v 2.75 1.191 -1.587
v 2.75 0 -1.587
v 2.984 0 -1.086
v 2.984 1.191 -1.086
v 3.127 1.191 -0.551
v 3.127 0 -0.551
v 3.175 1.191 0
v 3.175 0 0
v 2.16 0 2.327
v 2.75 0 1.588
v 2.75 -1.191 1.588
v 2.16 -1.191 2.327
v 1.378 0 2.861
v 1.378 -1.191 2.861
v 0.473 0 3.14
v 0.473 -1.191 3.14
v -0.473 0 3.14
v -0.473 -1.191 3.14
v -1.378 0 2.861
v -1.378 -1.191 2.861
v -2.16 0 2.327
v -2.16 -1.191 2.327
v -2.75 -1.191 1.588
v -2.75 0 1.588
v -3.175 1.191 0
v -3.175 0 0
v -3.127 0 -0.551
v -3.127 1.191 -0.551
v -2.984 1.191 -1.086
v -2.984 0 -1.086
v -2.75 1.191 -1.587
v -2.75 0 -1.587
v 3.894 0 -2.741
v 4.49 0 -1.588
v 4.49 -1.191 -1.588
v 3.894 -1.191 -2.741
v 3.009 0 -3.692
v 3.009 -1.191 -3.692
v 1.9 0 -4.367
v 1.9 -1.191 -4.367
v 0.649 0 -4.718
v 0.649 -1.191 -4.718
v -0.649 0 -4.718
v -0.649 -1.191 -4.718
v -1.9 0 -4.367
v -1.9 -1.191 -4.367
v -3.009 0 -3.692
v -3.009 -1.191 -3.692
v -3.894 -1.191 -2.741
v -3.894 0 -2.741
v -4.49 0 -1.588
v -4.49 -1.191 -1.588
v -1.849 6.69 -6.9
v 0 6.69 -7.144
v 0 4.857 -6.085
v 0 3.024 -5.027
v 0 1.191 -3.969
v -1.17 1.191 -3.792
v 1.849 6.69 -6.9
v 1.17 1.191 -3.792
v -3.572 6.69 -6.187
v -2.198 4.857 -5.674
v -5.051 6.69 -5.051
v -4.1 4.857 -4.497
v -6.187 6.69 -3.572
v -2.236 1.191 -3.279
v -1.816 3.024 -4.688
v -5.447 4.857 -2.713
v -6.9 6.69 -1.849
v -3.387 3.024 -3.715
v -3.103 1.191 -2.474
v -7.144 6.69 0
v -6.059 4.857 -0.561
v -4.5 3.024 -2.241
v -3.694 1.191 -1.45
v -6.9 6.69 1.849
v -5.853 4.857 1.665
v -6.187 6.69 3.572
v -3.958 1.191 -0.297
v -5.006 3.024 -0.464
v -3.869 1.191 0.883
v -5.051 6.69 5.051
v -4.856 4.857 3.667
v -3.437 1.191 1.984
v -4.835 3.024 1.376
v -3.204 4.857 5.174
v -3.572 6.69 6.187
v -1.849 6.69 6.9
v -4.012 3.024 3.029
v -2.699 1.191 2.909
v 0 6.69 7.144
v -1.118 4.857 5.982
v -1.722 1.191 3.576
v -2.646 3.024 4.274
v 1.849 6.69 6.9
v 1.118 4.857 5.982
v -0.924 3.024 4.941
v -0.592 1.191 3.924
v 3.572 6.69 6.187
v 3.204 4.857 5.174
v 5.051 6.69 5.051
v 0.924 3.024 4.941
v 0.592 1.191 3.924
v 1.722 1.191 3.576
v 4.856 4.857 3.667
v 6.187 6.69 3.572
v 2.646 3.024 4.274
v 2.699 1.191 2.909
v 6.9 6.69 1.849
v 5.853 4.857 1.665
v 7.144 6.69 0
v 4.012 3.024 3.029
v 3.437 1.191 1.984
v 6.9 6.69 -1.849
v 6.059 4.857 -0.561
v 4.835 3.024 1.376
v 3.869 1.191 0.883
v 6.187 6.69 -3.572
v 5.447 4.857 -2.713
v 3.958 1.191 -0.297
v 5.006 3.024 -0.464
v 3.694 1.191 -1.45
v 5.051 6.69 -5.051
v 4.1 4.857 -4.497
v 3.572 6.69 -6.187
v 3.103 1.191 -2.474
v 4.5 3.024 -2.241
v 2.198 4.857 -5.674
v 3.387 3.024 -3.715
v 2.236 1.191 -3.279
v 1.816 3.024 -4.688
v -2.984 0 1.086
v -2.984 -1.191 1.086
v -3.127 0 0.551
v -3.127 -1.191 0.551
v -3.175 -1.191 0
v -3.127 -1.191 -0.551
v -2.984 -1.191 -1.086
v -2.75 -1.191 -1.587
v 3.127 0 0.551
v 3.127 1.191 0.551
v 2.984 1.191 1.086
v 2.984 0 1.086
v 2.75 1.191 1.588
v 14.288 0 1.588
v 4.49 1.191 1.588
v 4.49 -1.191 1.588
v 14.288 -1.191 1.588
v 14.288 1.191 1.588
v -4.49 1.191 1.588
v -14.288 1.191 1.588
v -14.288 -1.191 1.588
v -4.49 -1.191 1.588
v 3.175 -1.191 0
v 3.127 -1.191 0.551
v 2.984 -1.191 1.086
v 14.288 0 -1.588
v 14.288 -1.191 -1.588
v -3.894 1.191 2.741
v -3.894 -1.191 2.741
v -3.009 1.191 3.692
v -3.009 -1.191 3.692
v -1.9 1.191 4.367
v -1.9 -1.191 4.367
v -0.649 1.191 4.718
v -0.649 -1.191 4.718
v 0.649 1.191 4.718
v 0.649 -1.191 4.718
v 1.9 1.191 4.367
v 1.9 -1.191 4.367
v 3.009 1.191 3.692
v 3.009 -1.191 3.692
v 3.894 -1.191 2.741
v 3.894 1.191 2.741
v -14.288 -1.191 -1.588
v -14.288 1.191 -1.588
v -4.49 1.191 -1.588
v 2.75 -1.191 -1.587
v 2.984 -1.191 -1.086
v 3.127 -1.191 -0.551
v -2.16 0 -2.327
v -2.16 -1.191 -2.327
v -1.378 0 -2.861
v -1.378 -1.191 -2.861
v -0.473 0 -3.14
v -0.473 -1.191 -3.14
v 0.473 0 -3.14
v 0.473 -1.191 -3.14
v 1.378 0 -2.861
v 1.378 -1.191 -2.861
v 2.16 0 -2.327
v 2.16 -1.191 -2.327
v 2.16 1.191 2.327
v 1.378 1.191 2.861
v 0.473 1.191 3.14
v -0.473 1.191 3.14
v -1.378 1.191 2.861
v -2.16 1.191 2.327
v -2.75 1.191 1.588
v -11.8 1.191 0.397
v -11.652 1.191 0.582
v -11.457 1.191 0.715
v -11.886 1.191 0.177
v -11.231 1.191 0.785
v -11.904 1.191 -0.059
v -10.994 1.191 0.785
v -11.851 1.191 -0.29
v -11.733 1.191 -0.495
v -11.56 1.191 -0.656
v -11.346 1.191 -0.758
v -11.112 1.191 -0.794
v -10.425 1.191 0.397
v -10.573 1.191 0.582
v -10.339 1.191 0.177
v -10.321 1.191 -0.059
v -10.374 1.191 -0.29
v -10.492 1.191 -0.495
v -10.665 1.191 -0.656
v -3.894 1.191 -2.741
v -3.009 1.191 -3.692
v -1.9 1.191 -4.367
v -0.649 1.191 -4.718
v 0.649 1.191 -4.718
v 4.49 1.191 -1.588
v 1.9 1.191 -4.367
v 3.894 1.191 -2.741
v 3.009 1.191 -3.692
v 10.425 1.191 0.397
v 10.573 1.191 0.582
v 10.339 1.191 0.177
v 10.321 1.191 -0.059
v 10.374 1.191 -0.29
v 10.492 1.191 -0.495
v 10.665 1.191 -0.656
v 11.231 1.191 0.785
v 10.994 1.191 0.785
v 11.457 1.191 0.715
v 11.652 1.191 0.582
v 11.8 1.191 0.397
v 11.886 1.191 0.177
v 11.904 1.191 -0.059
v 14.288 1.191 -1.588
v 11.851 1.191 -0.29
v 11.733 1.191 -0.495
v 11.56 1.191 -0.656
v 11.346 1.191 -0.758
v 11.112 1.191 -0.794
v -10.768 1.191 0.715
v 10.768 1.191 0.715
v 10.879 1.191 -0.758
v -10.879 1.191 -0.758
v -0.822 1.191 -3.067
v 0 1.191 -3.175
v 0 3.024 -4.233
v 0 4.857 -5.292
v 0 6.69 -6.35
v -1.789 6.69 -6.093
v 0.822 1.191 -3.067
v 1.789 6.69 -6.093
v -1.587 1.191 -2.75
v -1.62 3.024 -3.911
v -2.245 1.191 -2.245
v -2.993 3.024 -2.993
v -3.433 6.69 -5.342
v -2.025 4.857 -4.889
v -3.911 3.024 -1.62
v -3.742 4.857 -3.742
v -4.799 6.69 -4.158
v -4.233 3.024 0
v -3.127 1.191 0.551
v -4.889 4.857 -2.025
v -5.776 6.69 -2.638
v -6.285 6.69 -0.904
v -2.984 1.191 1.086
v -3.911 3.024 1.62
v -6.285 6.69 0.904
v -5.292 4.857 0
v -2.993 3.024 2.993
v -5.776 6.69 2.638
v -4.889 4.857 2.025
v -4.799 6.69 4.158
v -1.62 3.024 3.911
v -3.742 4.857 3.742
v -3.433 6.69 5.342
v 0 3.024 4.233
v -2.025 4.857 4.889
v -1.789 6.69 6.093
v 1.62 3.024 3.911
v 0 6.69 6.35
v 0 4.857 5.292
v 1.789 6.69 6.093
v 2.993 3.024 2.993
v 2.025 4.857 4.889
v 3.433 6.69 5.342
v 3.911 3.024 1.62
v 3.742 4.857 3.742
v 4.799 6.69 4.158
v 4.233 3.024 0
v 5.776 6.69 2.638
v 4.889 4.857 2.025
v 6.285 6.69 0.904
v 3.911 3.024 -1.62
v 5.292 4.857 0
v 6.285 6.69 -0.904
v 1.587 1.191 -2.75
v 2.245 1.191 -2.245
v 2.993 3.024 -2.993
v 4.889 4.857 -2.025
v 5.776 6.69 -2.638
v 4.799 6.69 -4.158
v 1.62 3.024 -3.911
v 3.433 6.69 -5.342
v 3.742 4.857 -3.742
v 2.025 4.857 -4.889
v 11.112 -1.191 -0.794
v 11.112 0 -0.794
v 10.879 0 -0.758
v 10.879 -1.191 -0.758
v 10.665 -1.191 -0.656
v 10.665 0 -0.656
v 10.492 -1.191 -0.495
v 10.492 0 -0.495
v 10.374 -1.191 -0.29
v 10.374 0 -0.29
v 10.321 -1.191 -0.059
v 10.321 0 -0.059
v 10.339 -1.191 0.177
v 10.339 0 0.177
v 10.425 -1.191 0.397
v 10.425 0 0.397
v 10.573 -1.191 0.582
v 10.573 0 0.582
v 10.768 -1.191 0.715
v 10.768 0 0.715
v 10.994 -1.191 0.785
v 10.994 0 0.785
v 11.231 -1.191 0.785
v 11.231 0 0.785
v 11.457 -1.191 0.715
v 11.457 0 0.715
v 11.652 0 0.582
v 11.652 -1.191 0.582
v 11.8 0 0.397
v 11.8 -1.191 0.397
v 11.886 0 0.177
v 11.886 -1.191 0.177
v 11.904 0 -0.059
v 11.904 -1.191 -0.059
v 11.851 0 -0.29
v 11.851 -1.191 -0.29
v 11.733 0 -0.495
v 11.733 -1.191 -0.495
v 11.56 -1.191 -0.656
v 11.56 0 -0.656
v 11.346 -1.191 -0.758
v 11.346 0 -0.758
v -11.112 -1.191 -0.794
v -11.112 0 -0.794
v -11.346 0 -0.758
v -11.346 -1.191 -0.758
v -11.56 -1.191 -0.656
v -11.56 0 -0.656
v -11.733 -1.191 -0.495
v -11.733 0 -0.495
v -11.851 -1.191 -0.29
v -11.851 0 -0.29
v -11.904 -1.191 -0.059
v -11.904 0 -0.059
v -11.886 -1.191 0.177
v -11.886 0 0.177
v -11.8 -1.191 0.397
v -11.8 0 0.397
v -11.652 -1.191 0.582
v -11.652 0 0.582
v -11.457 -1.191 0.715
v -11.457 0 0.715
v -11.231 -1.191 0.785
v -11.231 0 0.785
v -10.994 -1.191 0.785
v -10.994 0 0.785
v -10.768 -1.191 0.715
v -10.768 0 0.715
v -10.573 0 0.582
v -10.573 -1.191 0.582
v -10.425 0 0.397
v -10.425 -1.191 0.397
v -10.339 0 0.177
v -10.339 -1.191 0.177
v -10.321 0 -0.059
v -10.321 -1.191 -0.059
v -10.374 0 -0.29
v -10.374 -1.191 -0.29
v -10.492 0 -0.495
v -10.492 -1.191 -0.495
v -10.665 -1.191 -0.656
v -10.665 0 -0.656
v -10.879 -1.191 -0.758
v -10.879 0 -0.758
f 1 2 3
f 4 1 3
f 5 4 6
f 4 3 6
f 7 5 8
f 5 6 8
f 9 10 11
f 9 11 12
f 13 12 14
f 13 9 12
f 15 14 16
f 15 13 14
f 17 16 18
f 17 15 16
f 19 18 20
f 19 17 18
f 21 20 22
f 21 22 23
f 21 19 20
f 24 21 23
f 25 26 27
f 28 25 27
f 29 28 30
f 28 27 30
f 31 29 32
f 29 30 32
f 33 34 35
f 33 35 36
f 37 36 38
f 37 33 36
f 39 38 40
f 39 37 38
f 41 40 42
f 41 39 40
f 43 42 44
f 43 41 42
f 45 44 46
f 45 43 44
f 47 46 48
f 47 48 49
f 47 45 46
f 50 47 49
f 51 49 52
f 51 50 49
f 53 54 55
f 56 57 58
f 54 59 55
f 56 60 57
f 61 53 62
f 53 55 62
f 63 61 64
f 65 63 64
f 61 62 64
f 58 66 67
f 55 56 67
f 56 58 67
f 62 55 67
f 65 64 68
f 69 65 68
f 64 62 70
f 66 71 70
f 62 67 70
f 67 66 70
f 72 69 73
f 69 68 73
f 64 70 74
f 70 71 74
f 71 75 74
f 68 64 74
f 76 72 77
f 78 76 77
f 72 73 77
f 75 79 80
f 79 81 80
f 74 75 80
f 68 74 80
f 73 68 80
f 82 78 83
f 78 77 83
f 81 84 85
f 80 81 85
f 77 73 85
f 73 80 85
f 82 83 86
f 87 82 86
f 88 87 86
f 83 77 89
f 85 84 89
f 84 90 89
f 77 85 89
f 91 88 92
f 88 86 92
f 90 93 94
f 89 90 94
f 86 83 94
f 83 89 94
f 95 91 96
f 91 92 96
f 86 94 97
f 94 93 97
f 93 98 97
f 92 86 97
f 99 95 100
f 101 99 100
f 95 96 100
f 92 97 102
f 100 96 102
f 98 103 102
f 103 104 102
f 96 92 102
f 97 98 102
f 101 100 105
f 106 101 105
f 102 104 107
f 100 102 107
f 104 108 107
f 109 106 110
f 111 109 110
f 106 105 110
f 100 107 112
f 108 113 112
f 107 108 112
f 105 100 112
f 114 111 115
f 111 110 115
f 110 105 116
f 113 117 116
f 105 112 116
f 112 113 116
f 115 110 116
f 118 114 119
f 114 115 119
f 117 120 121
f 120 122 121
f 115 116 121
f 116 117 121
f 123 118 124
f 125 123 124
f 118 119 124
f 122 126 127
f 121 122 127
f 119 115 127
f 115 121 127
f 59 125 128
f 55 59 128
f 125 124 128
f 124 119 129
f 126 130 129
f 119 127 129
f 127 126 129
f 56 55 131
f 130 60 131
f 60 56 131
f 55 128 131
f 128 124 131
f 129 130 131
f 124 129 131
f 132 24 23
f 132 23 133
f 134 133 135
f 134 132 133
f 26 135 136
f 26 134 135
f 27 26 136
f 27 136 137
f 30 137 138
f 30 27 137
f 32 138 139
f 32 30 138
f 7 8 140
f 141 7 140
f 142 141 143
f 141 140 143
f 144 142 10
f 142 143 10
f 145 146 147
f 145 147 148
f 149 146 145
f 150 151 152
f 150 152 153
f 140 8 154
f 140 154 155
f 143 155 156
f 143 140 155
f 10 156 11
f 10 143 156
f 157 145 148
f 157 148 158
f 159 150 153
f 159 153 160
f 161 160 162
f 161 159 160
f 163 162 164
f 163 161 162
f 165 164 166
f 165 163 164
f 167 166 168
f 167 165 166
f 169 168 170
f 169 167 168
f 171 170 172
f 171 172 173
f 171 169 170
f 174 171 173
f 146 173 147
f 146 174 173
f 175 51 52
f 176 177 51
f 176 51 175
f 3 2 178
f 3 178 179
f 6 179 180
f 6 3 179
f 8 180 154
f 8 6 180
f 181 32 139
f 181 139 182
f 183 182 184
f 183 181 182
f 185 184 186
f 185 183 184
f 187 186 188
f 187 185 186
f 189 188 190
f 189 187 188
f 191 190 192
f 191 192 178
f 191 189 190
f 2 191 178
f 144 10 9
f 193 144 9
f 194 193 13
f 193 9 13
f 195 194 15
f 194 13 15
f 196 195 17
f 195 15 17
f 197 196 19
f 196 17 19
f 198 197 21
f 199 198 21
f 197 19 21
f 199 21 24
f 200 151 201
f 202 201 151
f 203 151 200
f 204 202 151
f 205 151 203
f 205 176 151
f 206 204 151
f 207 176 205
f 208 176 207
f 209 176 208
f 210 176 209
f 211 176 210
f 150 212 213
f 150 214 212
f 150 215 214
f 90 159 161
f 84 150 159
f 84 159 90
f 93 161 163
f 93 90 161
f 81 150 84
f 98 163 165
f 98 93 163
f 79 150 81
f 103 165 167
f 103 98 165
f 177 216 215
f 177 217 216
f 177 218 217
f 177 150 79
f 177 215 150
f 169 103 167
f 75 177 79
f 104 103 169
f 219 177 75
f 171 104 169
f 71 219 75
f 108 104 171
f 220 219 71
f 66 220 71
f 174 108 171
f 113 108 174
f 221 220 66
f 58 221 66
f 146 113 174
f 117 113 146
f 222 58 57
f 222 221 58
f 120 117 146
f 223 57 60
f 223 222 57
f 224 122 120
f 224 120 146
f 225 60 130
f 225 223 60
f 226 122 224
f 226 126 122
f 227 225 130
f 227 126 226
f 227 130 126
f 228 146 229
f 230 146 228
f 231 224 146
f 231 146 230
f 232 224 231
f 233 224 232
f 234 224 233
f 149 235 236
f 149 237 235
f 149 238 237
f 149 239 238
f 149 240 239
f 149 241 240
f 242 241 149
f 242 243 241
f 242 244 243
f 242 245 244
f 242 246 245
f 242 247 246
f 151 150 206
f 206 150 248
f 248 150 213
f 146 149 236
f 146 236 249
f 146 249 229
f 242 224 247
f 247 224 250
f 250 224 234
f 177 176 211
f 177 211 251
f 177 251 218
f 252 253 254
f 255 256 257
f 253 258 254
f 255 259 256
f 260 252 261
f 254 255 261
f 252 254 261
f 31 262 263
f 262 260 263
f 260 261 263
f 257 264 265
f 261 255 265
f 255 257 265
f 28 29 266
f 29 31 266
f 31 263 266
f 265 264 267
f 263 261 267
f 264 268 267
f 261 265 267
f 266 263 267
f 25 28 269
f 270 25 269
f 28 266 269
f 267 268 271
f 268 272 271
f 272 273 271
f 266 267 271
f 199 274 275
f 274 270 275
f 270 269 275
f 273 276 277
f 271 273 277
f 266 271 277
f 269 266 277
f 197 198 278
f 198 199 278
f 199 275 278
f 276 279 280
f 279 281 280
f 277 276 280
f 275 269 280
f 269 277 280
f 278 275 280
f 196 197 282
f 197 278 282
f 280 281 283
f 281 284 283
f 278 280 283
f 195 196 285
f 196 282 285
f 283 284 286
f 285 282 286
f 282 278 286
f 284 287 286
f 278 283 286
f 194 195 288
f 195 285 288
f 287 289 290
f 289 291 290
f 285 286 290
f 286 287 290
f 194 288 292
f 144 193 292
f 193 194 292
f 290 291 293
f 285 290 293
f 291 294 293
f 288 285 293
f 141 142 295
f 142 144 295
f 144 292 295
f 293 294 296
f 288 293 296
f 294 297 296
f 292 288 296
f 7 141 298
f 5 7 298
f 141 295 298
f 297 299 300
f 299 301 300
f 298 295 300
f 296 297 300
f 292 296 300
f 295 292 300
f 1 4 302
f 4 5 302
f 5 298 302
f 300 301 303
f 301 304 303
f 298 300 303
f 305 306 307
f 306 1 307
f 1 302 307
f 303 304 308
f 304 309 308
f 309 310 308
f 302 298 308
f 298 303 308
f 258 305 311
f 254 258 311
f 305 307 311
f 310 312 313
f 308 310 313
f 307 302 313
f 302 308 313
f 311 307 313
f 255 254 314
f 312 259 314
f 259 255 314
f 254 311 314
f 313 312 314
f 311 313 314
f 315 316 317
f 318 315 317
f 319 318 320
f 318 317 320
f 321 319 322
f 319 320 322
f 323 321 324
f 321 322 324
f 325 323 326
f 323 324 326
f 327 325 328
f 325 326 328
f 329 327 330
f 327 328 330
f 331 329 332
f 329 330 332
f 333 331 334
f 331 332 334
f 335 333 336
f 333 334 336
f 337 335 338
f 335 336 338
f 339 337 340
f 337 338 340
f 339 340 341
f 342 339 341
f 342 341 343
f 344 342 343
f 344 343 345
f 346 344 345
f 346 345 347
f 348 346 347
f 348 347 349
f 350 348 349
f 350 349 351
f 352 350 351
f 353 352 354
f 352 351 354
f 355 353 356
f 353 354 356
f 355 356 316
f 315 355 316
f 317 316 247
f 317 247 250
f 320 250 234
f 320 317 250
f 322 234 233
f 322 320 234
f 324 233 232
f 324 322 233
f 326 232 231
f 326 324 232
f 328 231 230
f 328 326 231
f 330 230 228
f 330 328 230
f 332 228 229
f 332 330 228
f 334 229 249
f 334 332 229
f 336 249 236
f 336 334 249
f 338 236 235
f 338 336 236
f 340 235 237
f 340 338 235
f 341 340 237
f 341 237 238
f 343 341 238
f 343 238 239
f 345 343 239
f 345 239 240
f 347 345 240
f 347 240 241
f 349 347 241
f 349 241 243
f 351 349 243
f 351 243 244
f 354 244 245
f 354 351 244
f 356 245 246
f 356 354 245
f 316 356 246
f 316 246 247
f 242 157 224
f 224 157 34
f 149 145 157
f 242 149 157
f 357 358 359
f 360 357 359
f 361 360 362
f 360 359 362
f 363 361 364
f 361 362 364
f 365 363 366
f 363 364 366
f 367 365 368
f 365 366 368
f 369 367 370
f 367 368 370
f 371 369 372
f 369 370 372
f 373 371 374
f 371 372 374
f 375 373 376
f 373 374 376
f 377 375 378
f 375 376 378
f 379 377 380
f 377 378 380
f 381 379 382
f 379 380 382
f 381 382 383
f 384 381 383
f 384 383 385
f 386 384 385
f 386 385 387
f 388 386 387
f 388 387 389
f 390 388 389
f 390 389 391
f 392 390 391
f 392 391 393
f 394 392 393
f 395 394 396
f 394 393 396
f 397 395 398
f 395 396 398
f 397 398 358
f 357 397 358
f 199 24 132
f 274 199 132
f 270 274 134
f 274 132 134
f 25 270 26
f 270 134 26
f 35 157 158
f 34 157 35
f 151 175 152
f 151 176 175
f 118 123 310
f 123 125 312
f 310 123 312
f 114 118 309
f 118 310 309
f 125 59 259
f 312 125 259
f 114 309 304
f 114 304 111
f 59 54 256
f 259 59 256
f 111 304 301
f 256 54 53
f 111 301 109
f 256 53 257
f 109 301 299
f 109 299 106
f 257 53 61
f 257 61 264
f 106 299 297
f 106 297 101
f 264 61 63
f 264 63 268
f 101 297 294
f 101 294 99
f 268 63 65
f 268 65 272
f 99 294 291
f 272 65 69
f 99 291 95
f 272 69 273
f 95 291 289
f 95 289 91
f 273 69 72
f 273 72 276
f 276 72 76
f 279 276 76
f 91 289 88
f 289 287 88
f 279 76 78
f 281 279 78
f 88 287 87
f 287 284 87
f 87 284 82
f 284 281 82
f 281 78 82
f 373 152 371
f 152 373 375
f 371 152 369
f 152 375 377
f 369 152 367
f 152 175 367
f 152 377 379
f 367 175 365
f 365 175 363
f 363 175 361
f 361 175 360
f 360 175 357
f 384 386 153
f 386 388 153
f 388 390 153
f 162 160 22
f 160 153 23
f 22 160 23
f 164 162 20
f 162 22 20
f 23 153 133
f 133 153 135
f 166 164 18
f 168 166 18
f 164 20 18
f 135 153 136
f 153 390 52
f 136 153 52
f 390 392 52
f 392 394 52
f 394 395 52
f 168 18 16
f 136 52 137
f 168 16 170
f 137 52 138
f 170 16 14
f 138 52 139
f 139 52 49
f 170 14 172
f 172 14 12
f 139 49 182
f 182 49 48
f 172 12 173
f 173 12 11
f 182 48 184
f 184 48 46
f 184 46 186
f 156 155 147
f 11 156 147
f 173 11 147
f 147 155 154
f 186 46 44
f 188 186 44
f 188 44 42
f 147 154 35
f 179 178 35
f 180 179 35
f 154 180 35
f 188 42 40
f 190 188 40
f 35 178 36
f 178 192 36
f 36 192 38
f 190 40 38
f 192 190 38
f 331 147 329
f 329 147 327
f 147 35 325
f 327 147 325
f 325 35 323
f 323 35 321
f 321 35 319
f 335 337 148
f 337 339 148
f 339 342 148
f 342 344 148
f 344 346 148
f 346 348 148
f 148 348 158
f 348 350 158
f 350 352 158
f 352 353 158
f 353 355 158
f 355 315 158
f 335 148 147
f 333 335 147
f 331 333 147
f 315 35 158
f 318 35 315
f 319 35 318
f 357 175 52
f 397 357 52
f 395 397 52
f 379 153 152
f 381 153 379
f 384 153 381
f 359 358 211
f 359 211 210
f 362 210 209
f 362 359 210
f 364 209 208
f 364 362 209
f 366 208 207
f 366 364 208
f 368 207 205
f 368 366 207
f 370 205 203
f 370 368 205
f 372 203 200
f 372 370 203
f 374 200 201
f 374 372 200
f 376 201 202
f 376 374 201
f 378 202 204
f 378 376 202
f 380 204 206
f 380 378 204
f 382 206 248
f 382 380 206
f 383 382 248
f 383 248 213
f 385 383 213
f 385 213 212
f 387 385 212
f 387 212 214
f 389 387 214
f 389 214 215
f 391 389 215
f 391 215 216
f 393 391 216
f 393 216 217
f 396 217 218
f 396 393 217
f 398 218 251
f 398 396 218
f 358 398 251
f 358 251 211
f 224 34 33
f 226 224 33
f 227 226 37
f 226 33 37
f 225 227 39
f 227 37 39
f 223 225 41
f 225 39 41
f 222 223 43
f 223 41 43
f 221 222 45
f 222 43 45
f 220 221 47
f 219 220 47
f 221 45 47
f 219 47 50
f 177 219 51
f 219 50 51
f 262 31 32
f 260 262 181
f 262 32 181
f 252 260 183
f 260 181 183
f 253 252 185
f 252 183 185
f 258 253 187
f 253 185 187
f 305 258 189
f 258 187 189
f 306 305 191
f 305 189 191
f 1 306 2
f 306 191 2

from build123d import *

# Parameters (mm, degrees)
SKETCH1_R           = 0.79375
BOSS_EXTRUDE1_DEPTH = 1.190625


with BuildPart() as part:
    # Sketch1 → Boss-Extrude1 (new, symmetric)
    # profile 1 of 14: a face of its own
    with BuildSketch(Plane(origin=(0, 0, 0), x_dir=(1, 0, 0), z_dir=(0, 1, 0))):
        with BuildLine():
            ThreePointArc((-4.682314967, -0.870248702), (-4.742411374, -0.436967517), (-4.7625, 0))
            ThreePointArc((-4.7625, 0), (-4.69391314, 0.805348174), (-4.490128061, 1.5875))
            Line((-4.490128061, 1.5875), (-14.2875, 1.5875))
            Line((-14.2875, 1.5875), (-14.2875, -1.5875))
            Line((-14.2875, -1.5875), (-5.924630657, -1.5875))
            Line((-5.924630657, -1.5875), (-4.682314967, -0.870248702))
        make_face()
        with Locations(Location((-11.1125, 0, 0), (0, 0, 90))):
            Circle(SKETCH1_R, mode=Mode.SUBTRACT)
    # profile 2 of 14: a face of its own
    with BuildSketch(Plane(origin=(0, 0, 0), x_dir=(1, 0, 0), z_dir=(0, 1, 0))):
        with BuildLine():
            ThreePointArc((-2.749630657, 1.5875), (0, 3.175), (2.749630657, 1.5875))
            Line((2.749630657, 1.5875), (4.490128061, 1.5875))
            ThreePointArc((4.490128061, 1.5875), (0, 4.7625), (-4.490128061, 1.5875))
            Line((-4.490128061, 1.5875), (-2.749630657, 1.5875))
        make_face()
    # profile 3 of 14: a face of its own
    with BuildSketch(Plane(origin=(0, 0, 0), x_dir=(1, 0, 0), z_dir=(0, 1, 0))):
        with BuildLine():
            ThreePointArc((4.490128061, 1.5875), (4.69391314, 0.805348174), (4.7625, 0))
            ThreePointArc((4.7625, 0), (4.742411374, -0.436967517), (4.682314967, -0.870248702))
            Line((4.682314967, -0.870248702), (5.924630657, -1.5875))
            Line((5.924630657, -1.5875), (14.2875, -1.5875))
            Line((14.2875, -1.5875), (14.2875, 1.5875))
            Line((14.2875, 1.5875), (4.490128061, 1.5875))
        make_face()
        with Locations(Location((11.1125, 0, 0), (0, 0, 90))):
            Circle(SKETCH1_R, mode=Mode.SUBTRACT)
    # profile 4 of 14: a face of its own
    with BuildSketch(Plane(origin=(0, 0, 0), x_dir=(1, 0, 0), z_dir=(0, 1, 0))):
        with BuildLine():
            ThreePointArc((2.749630657, 1.5875), (3.066814498, 0.821750468), (3.175, 0))
            Line((3.175, 0), (4.7625, 0))
            ThreePointArc((4.7625, 0), (4.69391314, 0.805348174), (4.490128061, 1.5875))
            Line((4.490128061, 1.5875), (2.749630657, 1.5875))
        make_face()
    # profile 5 of 14: a face of its own
    with BuildSketch(Plane(origin=(0, 0, 0), x_dir=(1, 0, 0), z_dir=(0, 1, 0))):
        with BuildLine():
            Line((-4.7625, 0), (-3.175, 0))
            ThreePointArc((-3.175, 0), (-3.066814498, 0.821750468), (-2.749630657, 1.5875))
            Line((-2.749630657, 1.5875), (-4.490128061, 1.5875))
            ThreePointArc((-4.490128061, 1.5875), (-4.69391314, 0.805348174), (-4.7625, 0))
        make_face()
    # profile 6 of 14: a face of its own
    with BuildSketch(Plane(origin=(0, 0, 0), x_dir=(1, 0, 0), z_dir=(0, 1, 0))):
        with BuildLine():
            Line((4.7625, 0), (3.175, 0))
            Line((3.175, 0), (4.682314967, -0.870248702))
            ThreePointArc((4.682314967, -0.870248702), (4.742411374, -0.436967517), (4.7625, 0))
        make_face()
    # profile 7 of 14: a face of its own
    with BuildSketch(Plane(origin=(0, 0, 0), x_dir=(1, 0, 0), z_dir=(0, 1, 0))):
        with BuildLine():
            Line((4.682314967, -0.870248702), (3.175, 0))
            ThreePointArc((3.175, 0), (3.066814498, -0.821750468), (2.749630657, -1.5875))
            Line((2.749630657, -1.5875), (4.490128061, -1.5875))
            ThreePointArc((4.490128061, -1.5875), (4.600221748, -1.232625702), (4.682314967, -0.870248702))
        make_face()
    # profile 8 of 14: a face of its own
    with BuildSketch(Plane(origin=(0, 0, 0), x_dir=(1, 0, 0), z_dir=(0, 1, 0))):
        with BuildLine():
            Line((4.490128061, -1.5875), (2.749630657, -1.5875))
            ThreePointArc((2.749630657, -1.5875), (0, -3.175), (-2.749630657, -1.5875))
            Line((-2.749630657, -1.5875), (-4.490128061, -1.5875))
            ThreePointArc((-4.490128061, -1.5875), (0, -4.7625), (4.490128061, -1.5875))
        make_face()
    # profile 9 of 14: a face of its own
    with BuildSketch(Plane(origin=(0, 0, 0), x_dir=(1, 0, 0), z_dir=(0, 1, 0))):
        with BuildLine():
            ThreePointArc((-2.749630657, -1.5875), (-3.066814498, -0.821750468), (-3.175, 0))
            Line((-3.175, 0), (-4.682314967, -0.870248702))
            ThreePointArc((-4.682314967, -0.870248702), (-4.600221748, -1.232625702), (-4.490128061, -1.5875))
            Line((-4.490128061, -1.5875), (-2.749630657, -1.5875))
        make_face()
    # profile 10 of 14: a face of its own
    with BuildSketch(Plane(origin=(0, 0, 0), x_dir=(1, 0, 0), z_dir=(0, 1, 0))):
        with BuildLine():
            ThreePointArc((2.749630657, 1.5875), (3.066814498, 0.821750468), (3.175, 0))
            Line((3.175, 0), (4.7625, 0))
            ThreePointArc((4.7625, 0), (4.69391314, 0.805348174), (4.490128061, 1.5875))
            Line((4.490128061, 1.5875), (2.749630657, 1.5875))
        make_face()
    # profile 11 of 14: a face of its own
    with BuildSketch(Plane(origin=(0, 0, 0), x_dir=(1, 0, 0), z_dir=(0, 1, 0))):
        with BuildLine():
            Line((-4.7625, 0), (-3.175, 0))
            ThreePointArc((-3.175, 0), (-3.066814498, 0.821750468), (-2.749630657, 1.5875))
            Line((-2.749630657, 1.5875), (-4.490128061, 1.5875))
            ThreePointArc((-4.490128061, 1.5875), (-4.69391314, 0.805348174), (-4.7625, 0))
        make_face()
    # profile 12 of 14: a face of its own
    with BuildSketch(Plane(origin=(0, 0, 0), x_dir=(1, 0, 0), z_dir=(0, 1, 0))):
        with BuildLine():
            Line((-4.682314967, -0.870248702), (-3.175, 0))
            Line((-3.175, 0), (-4.7625, 0))
            ThreePointArc((-4.7625, 0), (-4.742411374, -0.436967517), (-4.682314967, -0.870248702))
        make_face()
    # profile 13 of 14: a face of its own
    with BuildSketch(Plane(origin=(0, 0, 0), x_dir=(1, 0, 0), z_dir=(0, 1, 0))):
        with BuildLine():
            Line((5.924630657, -1.5875), (4.682314967, -0.870248702))
            ThreePointArc((4.682314967, -0.870248702), (4.600221748, -1.232625702), (4.490128061, -1.5875))
            Line((4.490128061, -1.5875), (5.924630657, -1.5875))
        make_face()
    # profile 14 of 14: a face of its own
    with BuildSketch(Plane(origin=(0, 0, 0), x_dir=(1, 0, 0), z_dir=(0, 1, 0))):
        with BuildLine():
            ThreePointArc((-4.490128061, -1.5875), (-4.600221748, -1.232625702), (-4.682314967, -0.870248702))
            Line((-4.682314967, -0.870248702), (-5.924630657, -1.5875))
            Line((-5.924630657, -1.5875), (-4.490128061, -1.5875))
        make_face()
    extrude(amount=BOSS_EXTRUDE1_DEPTH, both=True)

    # Sketch2 → Revolve2 (revolve)
    with BuildSketch(Plane.XY, mode=Mode.PRIVATE) as revolve2_sk:
        Polygon((-3.175, 1.190625), (-6.35, 6.689886314), (-7.14375, 6.689886314), (-3.96875, 1.190625), align=None)
    revolve(revolve2_sk.sketch.rotate(Axis((0, -1000, 0), (0, 1, 0)), 270), axis=Axis((0, -1000, 0), (0, 1, 0)))


solid = part.part
